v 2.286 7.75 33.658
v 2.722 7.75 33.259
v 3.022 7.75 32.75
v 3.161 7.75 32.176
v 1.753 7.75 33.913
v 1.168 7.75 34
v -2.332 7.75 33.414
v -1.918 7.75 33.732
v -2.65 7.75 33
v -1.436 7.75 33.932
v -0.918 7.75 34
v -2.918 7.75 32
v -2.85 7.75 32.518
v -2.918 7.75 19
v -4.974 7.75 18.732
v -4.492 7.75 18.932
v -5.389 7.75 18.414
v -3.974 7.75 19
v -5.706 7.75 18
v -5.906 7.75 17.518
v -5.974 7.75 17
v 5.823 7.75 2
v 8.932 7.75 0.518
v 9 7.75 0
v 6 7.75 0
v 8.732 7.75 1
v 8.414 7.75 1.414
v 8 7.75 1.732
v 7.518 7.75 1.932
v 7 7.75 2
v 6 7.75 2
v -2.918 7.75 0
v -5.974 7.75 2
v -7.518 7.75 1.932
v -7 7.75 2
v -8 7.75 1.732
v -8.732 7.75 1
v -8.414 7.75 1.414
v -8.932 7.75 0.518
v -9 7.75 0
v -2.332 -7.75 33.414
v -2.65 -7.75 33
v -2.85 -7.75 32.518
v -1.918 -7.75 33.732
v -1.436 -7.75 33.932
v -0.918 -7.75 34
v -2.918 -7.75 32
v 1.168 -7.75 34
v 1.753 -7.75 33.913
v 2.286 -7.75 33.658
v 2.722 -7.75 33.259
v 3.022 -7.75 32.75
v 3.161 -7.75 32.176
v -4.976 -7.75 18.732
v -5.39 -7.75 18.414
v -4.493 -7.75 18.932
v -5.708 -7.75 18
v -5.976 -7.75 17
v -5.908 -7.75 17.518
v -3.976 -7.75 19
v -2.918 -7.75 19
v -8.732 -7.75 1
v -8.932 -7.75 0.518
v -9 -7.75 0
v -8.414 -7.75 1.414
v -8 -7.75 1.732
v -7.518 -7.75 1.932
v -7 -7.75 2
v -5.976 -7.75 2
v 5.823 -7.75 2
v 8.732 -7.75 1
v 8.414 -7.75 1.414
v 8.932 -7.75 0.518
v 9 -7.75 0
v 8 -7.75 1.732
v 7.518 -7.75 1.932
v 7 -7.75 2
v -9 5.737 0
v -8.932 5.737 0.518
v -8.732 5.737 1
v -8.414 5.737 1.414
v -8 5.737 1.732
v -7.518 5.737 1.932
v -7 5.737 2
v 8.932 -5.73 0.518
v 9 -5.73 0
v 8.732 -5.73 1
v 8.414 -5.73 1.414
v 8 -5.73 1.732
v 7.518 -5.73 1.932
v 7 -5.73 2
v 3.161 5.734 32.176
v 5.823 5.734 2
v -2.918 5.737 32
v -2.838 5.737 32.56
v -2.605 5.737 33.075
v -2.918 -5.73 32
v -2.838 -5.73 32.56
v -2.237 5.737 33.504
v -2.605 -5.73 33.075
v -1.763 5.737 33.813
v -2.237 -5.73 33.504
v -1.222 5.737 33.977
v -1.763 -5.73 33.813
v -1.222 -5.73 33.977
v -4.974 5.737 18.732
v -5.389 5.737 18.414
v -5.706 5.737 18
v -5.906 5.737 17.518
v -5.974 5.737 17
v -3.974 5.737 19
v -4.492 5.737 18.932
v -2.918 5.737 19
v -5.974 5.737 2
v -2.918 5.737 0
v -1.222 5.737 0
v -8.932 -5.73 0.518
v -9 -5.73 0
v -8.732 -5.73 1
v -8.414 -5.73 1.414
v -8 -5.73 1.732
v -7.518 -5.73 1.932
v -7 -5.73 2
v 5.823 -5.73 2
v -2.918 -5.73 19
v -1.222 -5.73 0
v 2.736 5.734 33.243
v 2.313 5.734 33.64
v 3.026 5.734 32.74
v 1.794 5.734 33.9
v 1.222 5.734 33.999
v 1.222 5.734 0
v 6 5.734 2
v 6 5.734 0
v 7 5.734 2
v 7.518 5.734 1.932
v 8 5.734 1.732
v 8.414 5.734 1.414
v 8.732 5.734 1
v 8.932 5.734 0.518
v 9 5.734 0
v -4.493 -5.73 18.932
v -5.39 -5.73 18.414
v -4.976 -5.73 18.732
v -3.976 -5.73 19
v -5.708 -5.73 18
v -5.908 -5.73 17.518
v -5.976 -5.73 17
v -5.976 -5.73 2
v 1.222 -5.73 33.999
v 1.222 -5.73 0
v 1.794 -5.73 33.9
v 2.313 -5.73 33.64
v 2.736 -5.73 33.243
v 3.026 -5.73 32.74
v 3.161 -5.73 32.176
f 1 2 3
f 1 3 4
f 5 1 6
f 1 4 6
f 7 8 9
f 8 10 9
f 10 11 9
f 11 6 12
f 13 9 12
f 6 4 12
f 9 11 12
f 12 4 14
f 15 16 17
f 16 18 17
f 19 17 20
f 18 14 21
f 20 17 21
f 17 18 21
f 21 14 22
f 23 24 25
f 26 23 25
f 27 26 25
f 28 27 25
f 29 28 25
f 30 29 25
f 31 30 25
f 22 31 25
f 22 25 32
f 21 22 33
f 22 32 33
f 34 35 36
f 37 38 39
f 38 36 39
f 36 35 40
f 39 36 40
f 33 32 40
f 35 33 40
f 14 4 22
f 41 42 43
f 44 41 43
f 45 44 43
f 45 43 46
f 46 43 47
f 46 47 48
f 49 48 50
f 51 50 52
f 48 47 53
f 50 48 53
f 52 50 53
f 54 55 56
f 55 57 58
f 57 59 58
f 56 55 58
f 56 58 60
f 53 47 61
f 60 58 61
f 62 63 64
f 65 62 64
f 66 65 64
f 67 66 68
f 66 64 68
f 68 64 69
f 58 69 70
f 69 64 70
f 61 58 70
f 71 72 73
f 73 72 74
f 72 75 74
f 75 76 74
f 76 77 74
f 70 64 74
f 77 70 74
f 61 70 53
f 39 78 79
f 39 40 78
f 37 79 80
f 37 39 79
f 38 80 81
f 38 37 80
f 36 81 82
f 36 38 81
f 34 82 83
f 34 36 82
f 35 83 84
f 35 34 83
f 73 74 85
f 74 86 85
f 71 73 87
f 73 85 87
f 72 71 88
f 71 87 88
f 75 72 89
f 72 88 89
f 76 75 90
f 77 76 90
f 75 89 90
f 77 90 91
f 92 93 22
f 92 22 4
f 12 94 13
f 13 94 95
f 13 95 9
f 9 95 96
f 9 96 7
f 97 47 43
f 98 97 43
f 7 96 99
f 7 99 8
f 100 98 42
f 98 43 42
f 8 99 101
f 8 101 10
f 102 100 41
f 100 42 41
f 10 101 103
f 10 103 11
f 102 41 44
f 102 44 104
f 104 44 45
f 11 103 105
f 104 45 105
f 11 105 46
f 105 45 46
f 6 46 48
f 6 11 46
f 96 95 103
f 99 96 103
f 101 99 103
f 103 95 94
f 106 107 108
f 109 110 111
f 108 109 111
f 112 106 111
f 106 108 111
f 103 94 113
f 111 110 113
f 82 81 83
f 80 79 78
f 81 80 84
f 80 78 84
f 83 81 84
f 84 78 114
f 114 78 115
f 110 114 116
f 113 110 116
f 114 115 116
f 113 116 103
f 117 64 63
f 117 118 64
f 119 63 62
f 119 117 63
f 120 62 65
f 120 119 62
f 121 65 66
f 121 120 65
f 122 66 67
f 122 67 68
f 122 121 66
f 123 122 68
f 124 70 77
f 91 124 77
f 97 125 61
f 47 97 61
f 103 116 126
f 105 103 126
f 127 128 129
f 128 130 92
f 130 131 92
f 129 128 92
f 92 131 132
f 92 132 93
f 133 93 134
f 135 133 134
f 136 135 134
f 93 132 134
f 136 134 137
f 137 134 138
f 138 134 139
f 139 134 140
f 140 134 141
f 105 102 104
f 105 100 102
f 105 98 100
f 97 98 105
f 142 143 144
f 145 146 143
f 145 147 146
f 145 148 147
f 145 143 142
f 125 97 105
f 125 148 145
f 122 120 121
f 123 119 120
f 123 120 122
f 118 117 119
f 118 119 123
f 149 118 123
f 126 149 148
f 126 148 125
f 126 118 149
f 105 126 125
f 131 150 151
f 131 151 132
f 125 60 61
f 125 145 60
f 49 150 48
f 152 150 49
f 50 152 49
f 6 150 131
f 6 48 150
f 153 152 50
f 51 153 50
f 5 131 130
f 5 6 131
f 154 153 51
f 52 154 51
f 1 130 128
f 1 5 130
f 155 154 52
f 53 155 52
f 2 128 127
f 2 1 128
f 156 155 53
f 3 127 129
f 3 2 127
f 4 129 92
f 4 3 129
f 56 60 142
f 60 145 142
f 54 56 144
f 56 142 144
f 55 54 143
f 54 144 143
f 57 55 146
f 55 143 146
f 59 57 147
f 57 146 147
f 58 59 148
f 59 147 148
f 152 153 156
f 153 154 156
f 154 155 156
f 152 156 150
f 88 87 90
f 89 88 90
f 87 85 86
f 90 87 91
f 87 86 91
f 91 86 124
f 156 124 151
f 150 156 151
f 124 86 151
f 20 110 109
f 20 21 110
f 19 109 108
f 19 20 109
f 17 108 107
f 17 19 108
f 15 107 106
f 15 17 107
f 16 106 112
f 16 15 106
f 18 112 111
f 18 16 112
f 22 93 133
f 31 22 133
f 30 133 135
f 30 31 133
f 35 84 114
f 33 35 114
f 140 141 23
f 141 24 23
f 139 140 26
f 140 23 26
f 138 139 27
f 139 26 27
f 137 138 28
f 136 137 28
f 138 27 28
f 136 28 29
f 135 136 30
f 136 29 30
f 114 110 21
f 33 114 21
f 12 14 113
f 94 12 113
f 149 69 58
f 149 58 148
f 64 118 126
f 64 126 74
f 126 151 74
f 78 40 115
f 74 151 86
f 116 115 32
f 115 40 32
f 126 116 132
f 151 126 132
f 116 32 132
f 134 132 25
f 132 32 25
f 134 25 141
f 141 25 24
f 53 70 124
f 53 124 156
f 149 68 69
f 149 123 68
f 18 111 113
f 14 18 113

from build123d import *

# Parameters (mm, degrees)
F0_W        = 3.0256015398
F0_H        = 2.0134245381
F1_DEPTH    = 2
F0_W_2      = 3.0003240481
F0_H_2      = 2.0157374777
F0_H_3      = 2.019865565
F0_W_3      = 3.0242641605
F2_DEPTH    = 34
F3_DEPTH    = 34
F0_W_4      = 3.0575518031
F0_W_5      = 3.0562144239
F4_DEPTH    = 19
F5_T4_DEPTH = 178.7945589271
F5_T9_DEPTH = 178.7904308398
F7_F1_R     = 1.9999
F7_F2_R     = 1.9999
F7_F3_R     = 1.9999
F7_F4_R     = 1.9999
F7_F5_R     = 2
F7_F6_R     = 2
F7_F7_R     = 2
F8_F1_R     = 2


# Not quite as in the source:
# - a fillet or chamfer that OpenCascade refuses, or shapes differently, is made with other operations: its cross-section is extruded or revolved along the edge and cut away or added
# - two fillets or chamfers of one size are made in one step
# - a fillet or chamfer is up to 0.001 mm smaller than in the source, because OpenCascade refuses the exact size


with BuildPart() as f1:
    # F0 (on Top) → F1 (new body)
    with BuildSketch(Plane.XY):
        with Locations((-7.4871992301, 6.743287731)):
            Rectangle(F0_W, F0_H)
    extrude(amount=F1_DEPTH)



with BuildPart() as f1b:
    # F0 (on Top) → F1, piece 2 (new body)
    with BuildSketch(Plane.XY):
        with Locations((7.4998379759, 6.7421312612)):
            Rectangle(F0_W_2, F0_H_2)
    extrude(amount=F1_DEPTH)



with BuildPart() as f1c:
    # F0 (on Top) → F1, piece 3 (new body)
    with BuildSketch(Plane.XY):
        with Locations((7.4998379759, -6.7400672175)):
            Rectangle(F0_W_2, F0_H_3)
    extrude(amount=F1_DEPTH)


with BuildPart() as f1d:
    # F0 (on Top) → F1, piece 4 (new body)
    with BuildSketch(Plane.XY):
        with Locations((-7.4878679197, -6.7400672175)):
            Rectangle(F0_W_3, F0_H_3)
    extrude(amount=F1_DEPTH)


with BuildPart() as f2:
    # F0 (on Top) → F2 (new body)
    with BuildSketch(Plane.XY):
        Polygon((1.2222049991, -5.730134435), (1.2222049991, 5.7342625223), (1.2222049991, 7.5), (-1.2222049991, 7.5), (-1.2222049991, 5.7365754619), (-1.2222049991, -5.730134435), (-1.2222049991, -7.5), (1.2222049991, -7.5), align=None)
    extrude(amount=F2_DEPTH)


with BuildPart() as f1b_1:
    add(f1b.part)

    add(f1c.part)  # F3 merges F1c

    add(f2.part)  # F3 merges F2
    # F0 (on Top) → F3 (join)
    with BuildSketch(Plane.XY):
        Polygon((5.9996759519, 5.7342625223), (5.9996759519, 7.75), (-2.9181840364, 7.75), (-2.9181840364, 5.7365754619), (-1.2222049991, 5.7365754619), (-1.2222049991, 7.5), (1.2222049991, 7.5), (1.2222049991, 5.7342625223), align=None)
        Polygon((5.9996759519, -7.75), (5.9996759519, -5.730134435), (1.2222049991, -5.730134435), (1.2222049991, -7.5), (-1.2222049991, -7.5), (-1.2222049991, -5.730134435), (-2.9181840364, -5.730134435), (-2.9181840364, -7.75), align=None)
    extrude(amount=F3_DEPTH)


with BuildPart() as f1_1:
    add(f1.part)

    add(f1b_1.part)  # F4 merges F1b

    add(f1d.part)  # F4 merges F1d
    # F0 (on Top) → F4 (join)
    with BuildSketch(Plane.XY):
        with Locations((-4.4469599379, -6.7400672175)):
            Rectangle(F0_W_4, F0_H_3)
        with Locations((-4.4462912483, 6.743287731)):
            Rectangle(F0_W_5, F0_H)
    extrude(amount=F4_DEPTH)

    # F5: chamfer of 3 x 34 on 2 edges, made by hand


with BuildPart() as f5_tool2:
    # F5_s3 → F5_t4 (new body)
    with BuildSketch(Plane.XZ.offset(96.137346681)):
        Polygon((5.9996759519, 0), (2.9996759519, 34), (5.9996759519, 34), align=None)
    extrude(amount=-F5_T4_DEPTH)

    split(bisect_by=Plane.XY.offset(2), keep=Keep.TOP)


with BuildPart() as f1_2:
    add(f1_1.part)

    # F5_t1: cut F5_tool2
    add(f5_tool2.part, mode=Mode.SUBTRACT)


with BuildPart() as f5_tool7:
    # F5_s8 → F5_t9 (new body)
    with BuildSketch(Plane.XZ.offset(82.6530841587)):
        Polygon((5.9996759519, 0), (2.9996759519, 34), (5.9996759519, 34), align=None)
    extrude(amount=-F5_T9_DEPTH)

    split(bisect_by=Plane.XY.offset(2), keep=Keep.TOP)


with BuildPart() as f1_3:
    add(f1_2.part)

    # F5_t6: cut F5_tool7
    add(f5_tool7.part, mode=Mode.SUBTRACT)

    # F7: fillet of radius 2 on 8 edges, made by hand

    # F7_f1 (radius 2 in the source; OpenCascade refuses exactly that, so slightly less here)
    f7_f1_edges = [f1_3.edges().sort_by_distance(p)[0] for p in [
        (-9, -6.7400672175, 2),
    ]]
    fillet(f7_f1_edges, radius=F7_F1_R)

    # F7_f2 (radius 2 in the source; OpenCascade refuses exactly that, so slightly less here)
    f7_f2_edges = [f1_3.edges().sort_by_distance(p)[0] for p in [
        (9, -6.7400672175, 2),
    ]]
    fillet(f7_f2_edges, radius=F7_F2_R)

    # F7_f3 (radius 2 in the source; OpenCascade refuses exactly that, so slightly less here)
    f7_f3_edges = [f1_3.edges().sort_by_distance(p)[0] for p in [
        (9, 6.7421312612, 2),
    ]]
    fillet(f7_f3_edges, radius=F7_F3_R)

    # F7_f4 (radius 2 in the source; OpenCascade refuses exactly that, so slightly less here)
    f7_f4_edges = [f1_3.edges().sort_by_distance(p)[0] for p in [
        (-9, 6.743287731, 2),
    ]]
    fillet(f7_f4_edges, radius=F7_F4_R)

    # F7_f5
    f7_f5_edges = [f1_3.edges().sort_by_distance(p)[0] for p in [
        (-5.9743984602, 6.743287731, 19),
    ]]
    fillet(f7_f5_edges, radius=F7_F5_R)

    # F7_f6
    f7_f6_edges = [f1_3.edges().sort_by_distance(p)[0] for p in [
        (-2.9181840364, 6.743287731, 34),
    ]]
    fillet(f7_f6_edges, radius=F7_F6_R)

    # F7_f7
    f7_f7_edges = [f1_3.edges().sort_by_distance(p)[0] for p in [
        (-5.9757358395, -6.7400672175, 19),
    ]]
    fillet(f7_f7_edges, radius=F7_F7_R)

    # F8: fillet of radius 2 on 2 edges, made by hand

    # F8_f1
    f8_f1_edges = [f1_3.edges().sort_by_distance(p)[0] for p in [
        (2.9996759519, -6.7400672175, 34),
    ]]
    fillet(f8_f1_edges, radius=F8_F1_R)


solid = f1_3.part
